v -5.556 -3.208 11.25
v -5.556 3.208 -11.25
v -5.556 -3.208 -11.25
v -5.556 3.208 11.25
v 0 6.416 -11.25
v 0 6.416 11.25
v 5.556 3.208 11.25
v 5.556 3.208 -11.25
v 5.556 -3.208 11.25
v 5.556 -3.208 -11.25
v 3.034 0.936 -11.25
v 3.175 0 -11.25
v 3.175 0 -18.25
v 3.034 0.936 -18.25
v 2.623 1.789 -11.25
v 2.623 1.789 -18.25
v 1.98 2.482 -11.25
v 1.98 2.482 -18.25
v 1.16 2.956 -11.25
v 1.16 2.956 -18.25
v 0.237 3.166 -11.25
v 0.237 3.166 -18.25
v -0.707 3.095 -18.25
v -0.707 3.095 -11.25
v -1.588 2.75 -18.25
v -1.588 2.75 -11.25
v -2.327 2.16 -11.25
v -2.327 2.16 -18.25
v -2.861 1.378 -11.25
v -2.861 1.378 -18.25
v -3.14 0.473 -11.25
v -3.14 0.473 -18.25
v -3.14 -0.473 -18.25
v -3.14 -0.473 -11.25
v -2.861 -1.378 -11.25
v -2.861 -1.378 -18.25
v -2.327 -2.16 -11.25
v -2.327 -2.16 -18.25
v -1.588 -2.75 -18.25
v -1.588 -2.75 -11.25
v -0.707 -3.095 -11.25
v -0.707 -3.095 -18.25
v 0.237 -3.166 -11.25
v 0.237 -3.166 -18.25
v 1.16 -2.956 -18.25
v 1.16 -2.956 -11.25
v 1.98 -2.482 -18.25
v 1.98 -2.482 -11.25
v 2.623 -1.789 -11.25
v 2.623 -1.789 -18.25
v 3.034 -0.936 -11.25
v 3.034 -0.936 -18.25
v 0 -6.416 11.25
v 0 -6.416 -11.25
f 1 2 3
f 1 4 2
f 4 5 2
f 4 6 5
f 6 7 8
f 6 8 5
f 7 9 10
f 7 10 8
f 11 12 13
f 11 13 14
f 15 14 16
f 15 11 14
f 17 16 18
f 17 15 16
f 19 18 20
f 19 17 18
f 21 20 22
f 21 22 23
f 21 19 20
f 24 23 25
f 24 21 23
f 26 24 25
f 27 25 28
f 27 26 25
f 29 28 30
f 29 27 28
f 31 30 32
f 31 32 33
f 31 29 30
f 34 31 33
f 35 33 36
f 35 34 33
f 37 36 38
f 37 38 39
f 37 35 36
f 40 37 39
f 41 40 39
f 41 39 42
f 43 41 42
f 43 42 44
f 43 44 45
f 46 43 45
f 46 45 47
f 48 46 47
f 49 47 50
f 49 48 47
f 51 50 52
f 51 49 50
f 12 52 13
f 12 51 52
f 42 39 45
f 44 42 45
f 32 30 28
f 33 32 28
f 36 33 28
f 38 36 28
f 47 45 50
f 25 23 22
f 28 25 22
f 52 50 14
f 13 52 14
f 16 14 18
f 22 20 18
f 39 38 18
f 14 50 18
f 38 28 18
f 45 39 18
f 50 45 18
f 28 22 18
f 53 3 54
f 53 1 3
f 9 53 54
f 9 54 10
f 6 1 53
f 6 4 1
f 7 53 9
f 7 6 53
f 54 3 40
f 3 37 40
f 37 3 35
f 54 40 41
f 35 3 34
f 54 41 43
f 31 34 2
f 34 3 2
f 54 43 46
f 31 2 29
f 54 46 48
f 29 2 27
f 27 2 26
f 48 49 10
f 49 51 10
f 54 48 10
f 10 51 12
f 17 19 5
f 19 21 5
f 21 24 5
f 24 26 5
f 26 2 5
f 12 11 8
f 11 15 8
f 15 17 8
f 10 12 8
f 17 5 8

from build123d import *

# Parameters (mm, degrees)
BOSS_EXTRUDE2_DEPTH      = 11.25
BOSS_EXTRUDE2_DEPTH_BACK = 11.25
SKETCH4_R                = 3.175
BOSS_EXTRUDE3_DEPTH      = 7.0000114


with BuildPart() as part:
    # Sketch3 → Boss-Extrude2 (new body, two sides)
    with BuildSketch(Plane.XY) as boss_extrude2_sk:
        Polygon((-5.55625, -3.207902433), (0, -6.415804866), (5.55625, -3.207902433), (5.55625, 3.207902433), (0, 6.415804866), (-5.55625, 3.207902433), align=None)
    extrude(amount=BOSS_EXTRUDE2_DEPTH)
    extrude(boss_extrude2_sk.sketch, amount=-BOSS_EXTRUDE2_DEPTH_BACK)

    # Sketch4 → Boss-Extrude3 (add)
    with BuildSketch(Plane.XY.offset(-11.25)):
        Circle(SKETCH4_R)
    extrude(amount=-BOSS_EXTRUDE3_DEPTH)


solid = part.part
